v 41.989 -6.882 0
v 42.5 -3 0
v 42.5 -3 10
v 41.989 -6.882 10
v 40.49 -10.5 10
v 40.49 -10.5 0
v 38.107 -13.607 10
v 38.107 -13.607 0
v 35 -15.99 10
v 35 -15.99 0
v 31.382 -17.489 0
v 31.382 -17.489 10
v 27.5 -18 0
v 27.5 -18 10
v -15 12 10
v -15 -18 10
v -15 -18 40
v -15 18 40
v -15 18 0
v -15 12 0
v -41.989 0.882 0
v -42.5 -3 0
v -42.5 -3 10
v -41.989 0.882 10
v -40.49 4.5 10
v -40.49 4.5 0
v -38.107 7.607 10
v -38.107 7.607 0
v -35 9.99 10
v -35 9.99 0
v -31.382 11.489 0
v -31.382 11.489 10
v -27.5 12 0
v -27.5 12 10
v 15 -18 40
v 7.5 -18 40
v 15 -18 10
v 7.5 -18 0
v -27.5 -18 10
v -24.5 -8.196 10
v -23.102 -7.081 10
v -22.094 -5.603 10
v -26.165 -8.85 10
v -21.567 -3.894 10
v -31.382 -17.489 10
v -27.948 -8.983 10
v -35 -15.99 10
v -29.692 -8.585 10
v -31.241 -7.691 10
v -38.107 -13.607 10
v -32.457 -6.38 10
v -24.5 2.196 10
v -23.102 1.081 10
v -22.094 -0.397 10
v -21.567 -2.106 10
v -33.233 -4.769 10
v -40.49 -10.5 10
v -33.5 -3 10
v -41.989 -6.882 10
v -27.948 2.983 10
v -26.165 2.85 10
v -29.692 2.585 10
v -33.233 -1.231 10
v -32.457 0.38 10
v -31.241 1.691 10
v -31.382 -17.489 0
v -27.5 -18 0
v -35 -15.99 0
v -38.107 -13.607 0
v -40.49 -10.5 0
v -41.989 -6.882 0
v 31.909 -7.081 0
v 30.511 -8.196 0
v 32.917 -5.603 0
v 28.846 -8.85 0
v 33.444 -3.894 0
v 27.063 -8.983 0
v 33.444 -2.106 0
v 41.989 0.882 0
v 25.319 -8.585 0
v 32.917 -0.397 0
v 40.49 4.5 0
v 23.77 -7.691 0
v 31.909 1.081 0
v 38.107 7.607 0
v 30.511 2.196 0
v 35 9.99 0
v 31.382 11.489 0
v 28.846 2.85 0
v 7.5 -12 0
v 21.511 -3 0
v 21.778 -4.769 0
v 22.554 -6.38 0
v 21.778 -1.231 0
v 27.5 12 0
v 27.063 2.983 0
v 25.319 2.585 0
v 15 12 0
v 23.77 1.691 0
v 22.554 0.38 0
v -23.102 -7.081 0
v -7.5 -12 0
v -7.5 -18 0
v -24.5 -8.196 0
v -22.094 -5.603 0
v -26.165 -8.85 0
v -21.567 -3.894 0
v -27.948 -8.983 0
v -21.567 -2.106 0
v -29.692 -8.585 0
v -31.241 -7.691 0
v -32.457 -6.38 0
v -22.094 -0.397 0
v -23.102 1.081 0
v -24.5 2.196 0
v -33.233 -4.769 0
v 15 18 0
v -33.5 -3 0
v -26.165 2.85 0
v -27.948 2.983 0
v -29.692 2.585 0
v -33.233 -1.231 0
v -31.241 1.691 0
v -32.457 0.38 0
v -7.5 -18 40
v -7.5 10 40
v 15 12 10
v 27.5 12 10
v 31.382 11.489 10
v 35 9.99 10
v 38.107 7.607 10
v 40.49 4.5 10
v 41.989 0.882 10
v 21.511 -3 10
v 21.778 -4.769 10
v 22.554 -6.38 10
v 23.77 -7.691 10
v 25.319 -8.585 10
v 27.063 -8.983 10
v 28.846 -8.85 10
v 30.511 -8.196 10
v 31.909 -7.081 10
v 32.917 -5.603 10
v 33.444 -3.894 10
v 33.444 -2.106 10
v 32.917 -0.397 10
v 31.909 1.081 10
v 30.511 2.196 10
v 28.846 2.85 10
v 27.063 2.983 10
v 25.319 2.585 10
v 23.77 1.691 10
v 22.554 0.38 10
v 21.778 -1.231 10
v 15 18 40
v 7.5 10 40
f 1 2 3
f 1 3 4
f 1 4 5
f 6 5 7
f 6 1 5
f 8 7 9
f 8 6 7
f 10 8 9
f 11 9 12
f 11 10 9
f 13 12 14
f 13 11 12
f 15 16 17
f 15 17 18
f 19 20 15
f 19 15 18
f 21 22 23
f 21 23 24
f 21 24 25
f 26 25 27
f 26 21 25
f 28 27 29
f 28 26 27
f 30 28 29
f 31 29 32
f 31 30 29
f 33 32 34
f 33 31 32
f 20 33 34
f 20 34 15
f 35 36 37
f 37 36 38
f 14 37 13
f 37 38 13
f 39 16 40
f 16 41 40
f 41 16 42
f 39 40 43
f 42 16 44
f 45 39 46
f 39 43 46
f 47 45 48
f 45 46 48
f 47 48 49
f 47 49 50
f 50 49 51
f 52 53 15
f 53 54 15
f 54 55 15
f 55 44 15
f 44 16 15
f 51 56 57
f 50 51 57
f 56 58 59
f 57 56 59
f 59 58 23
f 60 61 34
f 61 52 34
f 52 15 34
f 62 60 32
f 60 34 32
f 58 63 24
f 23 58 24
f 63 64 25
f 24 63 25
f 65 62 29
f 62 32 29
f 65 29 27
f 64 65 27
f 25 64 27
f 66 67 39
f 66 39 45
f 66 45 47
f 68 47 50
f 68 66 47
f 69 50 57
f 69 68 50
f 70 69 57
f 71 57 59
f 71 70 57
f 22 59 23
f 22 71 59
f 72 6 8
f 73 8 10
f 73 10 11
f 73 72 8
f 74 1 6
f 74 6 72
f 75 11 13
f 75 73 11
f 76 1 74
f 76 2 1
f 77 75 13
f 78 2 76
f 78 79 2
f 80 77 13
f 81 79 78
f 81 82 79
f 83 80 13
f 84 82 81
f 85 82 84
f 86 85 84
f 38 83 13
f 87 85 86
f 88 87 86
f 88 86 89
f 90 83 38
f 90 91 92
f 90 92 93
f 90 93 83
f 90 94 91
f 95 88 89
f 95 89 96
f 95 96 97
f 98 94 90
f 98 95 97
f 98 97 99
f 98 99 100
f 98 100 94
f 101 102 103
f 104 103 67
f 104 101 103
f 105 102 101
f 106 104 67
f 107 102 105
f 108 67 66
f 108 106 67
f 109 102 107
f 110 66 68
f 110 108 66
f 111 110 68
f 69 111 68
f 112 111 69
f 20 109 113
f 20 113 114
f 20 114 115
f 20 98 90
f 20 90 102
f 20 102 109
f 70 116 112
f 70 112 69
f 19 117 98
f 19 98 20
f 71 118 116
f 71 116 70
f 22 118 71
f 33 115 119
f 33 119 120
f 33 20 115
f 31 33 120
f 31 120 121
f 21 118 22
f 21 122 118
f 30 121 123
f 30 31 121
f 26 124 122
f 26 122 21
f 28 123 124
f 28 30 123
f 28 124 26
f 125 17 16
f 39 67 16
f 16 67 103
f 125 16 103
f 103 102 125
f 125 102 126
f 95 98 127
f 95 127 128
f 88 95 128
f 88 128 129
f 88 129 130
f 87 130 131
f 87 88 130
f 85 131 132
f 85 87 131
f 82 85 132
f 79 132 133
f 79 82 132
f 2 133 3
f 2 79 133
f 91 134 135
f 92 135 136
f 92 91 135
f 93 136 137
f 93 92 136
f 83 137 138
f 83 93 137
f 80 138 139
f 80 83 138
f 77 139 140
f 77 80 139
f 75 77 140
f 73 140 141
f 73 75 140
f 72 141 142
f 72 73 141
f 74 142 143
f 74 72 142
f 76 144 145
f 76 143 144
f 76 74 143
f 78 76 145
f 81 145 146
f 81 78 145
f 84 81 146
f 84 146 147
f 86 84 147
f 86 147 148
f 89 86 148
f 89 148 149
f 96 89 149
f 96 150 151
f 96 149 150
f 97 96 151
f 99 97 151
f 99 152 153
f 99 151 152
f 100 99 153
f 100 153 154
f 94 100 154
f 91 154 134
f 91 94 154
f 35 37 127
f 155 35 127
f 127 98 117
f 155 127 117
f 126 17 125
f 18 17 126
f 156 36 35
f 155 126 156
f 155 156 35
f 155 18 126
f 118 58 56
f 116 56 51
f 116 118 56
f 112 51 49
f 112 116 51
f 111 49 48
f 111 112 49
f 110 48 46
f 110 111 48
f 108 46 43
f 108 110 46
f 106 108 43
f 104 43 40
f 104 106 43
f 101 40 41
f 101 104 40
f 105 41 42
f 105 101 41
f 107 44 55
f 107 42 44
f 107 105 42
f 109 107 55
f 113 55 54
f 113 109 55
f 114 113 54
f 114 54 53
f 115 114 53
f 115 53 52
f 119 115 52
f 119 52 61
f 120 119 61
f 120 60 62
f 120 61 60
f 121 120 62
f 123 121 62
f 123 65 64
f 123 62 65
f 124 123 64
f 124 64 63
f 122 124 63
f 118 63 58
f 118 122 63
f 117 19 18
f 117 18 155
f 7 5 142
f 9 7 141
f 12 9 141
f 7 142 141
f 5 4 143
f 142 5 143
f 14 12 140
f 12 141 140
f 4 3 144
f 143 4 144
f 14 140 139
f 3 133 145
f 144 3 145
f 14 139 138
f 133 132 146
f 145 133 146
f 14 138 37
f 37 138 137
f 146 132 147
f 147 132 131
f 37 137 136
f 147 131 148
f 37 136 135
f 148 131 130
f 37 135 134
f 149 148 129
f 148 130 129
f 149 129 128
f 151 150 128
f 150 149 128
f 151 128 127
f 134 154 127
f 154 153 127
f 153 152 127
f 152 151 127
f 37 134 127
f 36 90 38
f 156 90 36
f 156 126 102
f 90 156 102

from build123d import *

# Parameters (mm, degrees)
EXTRUDE_1_DEPTH     = 10
SKETCH_3_W          = 30
SKETCH_3_H          = 36
EXTRUDE_2_DEPTH     = 30
SKETCH_4_R          = 6
CUT_EXTRUDE_1_DEPTH = 52
CUT_EXTRUDE_START   = -7.5
CUT_EXTRUDE_2_DEPTH = 15


with BuildPart() as part:
    # 草图1 → 凸台-拉伸1 (new body)
    with BuildSketch(Plane.XY):
        with BuildLine():
            Line((15, -18), (-15, -18))
            Line((-15, -18), (-27.5, -18))
            ThreePointArc((-27.5, -18), (-38.106601718, -13.606601718), (-42.5, -3))
            ThreePointArc((-42.5, -3), (-38.106601718, 7.606601718), (-27.5, 12))
            Line((-27.5, 12), (-15, 12))
            Line((-15, 12), (-15, 18))
            Line((-15, 18), (15, 18))
            Line((15, 18), (15, 12))
            Line((15, 12), (27.5, 12))
            ThreePointArc((27.5, 12), (38.106601718, 7.606601718), (42.5, -3))
            ThreePointArc((42.5, -3), (38.106601718, -13.606601718), (27.5, -18))
            Line((27.5, -18), (15, -18))
        make_face()
    extrude(amount=EXTRUDE_1_DEPTH)

    # 草图3 → 凸台-拉伸2 (add)
    with BuildSketch(Plane.XY.offset(10)):
        Rectangle(SKETCH_3_W, SKETCH_3_H)
    extrude(amount=EXTRUDE_2_DEPTH)

    # 草图4 → 切除-拉伸1 (cut)
    with BuildSketch(Plane.XY):
        with Locations(Location((-27.5, -3, 0), (0, 0, 180))):
            Circle(SKETCH_4_R)
        with Locations(Location((27.511001478, -3, 0), (0, 0, 180))):
            Circle(SKETCH_4_R)
    extrude(amount=CUT_EXTRUDE_1_DEPTH, mode=Mode.SUBTRACT)

    # 草图5 → 切除-拉伸2 (cut)
    with BuildSketch(Plane.ZY.offset(15).offset(CUT_EXTRUDE_START)):
        Polygon((40, 10), (0, -12), (0, -18), (40, -18), align=None)
    extrude(amount=-CUT_EXTRUDE_2_DEPTH, mode=Mode.SUBTRACT)


solid = part.part
